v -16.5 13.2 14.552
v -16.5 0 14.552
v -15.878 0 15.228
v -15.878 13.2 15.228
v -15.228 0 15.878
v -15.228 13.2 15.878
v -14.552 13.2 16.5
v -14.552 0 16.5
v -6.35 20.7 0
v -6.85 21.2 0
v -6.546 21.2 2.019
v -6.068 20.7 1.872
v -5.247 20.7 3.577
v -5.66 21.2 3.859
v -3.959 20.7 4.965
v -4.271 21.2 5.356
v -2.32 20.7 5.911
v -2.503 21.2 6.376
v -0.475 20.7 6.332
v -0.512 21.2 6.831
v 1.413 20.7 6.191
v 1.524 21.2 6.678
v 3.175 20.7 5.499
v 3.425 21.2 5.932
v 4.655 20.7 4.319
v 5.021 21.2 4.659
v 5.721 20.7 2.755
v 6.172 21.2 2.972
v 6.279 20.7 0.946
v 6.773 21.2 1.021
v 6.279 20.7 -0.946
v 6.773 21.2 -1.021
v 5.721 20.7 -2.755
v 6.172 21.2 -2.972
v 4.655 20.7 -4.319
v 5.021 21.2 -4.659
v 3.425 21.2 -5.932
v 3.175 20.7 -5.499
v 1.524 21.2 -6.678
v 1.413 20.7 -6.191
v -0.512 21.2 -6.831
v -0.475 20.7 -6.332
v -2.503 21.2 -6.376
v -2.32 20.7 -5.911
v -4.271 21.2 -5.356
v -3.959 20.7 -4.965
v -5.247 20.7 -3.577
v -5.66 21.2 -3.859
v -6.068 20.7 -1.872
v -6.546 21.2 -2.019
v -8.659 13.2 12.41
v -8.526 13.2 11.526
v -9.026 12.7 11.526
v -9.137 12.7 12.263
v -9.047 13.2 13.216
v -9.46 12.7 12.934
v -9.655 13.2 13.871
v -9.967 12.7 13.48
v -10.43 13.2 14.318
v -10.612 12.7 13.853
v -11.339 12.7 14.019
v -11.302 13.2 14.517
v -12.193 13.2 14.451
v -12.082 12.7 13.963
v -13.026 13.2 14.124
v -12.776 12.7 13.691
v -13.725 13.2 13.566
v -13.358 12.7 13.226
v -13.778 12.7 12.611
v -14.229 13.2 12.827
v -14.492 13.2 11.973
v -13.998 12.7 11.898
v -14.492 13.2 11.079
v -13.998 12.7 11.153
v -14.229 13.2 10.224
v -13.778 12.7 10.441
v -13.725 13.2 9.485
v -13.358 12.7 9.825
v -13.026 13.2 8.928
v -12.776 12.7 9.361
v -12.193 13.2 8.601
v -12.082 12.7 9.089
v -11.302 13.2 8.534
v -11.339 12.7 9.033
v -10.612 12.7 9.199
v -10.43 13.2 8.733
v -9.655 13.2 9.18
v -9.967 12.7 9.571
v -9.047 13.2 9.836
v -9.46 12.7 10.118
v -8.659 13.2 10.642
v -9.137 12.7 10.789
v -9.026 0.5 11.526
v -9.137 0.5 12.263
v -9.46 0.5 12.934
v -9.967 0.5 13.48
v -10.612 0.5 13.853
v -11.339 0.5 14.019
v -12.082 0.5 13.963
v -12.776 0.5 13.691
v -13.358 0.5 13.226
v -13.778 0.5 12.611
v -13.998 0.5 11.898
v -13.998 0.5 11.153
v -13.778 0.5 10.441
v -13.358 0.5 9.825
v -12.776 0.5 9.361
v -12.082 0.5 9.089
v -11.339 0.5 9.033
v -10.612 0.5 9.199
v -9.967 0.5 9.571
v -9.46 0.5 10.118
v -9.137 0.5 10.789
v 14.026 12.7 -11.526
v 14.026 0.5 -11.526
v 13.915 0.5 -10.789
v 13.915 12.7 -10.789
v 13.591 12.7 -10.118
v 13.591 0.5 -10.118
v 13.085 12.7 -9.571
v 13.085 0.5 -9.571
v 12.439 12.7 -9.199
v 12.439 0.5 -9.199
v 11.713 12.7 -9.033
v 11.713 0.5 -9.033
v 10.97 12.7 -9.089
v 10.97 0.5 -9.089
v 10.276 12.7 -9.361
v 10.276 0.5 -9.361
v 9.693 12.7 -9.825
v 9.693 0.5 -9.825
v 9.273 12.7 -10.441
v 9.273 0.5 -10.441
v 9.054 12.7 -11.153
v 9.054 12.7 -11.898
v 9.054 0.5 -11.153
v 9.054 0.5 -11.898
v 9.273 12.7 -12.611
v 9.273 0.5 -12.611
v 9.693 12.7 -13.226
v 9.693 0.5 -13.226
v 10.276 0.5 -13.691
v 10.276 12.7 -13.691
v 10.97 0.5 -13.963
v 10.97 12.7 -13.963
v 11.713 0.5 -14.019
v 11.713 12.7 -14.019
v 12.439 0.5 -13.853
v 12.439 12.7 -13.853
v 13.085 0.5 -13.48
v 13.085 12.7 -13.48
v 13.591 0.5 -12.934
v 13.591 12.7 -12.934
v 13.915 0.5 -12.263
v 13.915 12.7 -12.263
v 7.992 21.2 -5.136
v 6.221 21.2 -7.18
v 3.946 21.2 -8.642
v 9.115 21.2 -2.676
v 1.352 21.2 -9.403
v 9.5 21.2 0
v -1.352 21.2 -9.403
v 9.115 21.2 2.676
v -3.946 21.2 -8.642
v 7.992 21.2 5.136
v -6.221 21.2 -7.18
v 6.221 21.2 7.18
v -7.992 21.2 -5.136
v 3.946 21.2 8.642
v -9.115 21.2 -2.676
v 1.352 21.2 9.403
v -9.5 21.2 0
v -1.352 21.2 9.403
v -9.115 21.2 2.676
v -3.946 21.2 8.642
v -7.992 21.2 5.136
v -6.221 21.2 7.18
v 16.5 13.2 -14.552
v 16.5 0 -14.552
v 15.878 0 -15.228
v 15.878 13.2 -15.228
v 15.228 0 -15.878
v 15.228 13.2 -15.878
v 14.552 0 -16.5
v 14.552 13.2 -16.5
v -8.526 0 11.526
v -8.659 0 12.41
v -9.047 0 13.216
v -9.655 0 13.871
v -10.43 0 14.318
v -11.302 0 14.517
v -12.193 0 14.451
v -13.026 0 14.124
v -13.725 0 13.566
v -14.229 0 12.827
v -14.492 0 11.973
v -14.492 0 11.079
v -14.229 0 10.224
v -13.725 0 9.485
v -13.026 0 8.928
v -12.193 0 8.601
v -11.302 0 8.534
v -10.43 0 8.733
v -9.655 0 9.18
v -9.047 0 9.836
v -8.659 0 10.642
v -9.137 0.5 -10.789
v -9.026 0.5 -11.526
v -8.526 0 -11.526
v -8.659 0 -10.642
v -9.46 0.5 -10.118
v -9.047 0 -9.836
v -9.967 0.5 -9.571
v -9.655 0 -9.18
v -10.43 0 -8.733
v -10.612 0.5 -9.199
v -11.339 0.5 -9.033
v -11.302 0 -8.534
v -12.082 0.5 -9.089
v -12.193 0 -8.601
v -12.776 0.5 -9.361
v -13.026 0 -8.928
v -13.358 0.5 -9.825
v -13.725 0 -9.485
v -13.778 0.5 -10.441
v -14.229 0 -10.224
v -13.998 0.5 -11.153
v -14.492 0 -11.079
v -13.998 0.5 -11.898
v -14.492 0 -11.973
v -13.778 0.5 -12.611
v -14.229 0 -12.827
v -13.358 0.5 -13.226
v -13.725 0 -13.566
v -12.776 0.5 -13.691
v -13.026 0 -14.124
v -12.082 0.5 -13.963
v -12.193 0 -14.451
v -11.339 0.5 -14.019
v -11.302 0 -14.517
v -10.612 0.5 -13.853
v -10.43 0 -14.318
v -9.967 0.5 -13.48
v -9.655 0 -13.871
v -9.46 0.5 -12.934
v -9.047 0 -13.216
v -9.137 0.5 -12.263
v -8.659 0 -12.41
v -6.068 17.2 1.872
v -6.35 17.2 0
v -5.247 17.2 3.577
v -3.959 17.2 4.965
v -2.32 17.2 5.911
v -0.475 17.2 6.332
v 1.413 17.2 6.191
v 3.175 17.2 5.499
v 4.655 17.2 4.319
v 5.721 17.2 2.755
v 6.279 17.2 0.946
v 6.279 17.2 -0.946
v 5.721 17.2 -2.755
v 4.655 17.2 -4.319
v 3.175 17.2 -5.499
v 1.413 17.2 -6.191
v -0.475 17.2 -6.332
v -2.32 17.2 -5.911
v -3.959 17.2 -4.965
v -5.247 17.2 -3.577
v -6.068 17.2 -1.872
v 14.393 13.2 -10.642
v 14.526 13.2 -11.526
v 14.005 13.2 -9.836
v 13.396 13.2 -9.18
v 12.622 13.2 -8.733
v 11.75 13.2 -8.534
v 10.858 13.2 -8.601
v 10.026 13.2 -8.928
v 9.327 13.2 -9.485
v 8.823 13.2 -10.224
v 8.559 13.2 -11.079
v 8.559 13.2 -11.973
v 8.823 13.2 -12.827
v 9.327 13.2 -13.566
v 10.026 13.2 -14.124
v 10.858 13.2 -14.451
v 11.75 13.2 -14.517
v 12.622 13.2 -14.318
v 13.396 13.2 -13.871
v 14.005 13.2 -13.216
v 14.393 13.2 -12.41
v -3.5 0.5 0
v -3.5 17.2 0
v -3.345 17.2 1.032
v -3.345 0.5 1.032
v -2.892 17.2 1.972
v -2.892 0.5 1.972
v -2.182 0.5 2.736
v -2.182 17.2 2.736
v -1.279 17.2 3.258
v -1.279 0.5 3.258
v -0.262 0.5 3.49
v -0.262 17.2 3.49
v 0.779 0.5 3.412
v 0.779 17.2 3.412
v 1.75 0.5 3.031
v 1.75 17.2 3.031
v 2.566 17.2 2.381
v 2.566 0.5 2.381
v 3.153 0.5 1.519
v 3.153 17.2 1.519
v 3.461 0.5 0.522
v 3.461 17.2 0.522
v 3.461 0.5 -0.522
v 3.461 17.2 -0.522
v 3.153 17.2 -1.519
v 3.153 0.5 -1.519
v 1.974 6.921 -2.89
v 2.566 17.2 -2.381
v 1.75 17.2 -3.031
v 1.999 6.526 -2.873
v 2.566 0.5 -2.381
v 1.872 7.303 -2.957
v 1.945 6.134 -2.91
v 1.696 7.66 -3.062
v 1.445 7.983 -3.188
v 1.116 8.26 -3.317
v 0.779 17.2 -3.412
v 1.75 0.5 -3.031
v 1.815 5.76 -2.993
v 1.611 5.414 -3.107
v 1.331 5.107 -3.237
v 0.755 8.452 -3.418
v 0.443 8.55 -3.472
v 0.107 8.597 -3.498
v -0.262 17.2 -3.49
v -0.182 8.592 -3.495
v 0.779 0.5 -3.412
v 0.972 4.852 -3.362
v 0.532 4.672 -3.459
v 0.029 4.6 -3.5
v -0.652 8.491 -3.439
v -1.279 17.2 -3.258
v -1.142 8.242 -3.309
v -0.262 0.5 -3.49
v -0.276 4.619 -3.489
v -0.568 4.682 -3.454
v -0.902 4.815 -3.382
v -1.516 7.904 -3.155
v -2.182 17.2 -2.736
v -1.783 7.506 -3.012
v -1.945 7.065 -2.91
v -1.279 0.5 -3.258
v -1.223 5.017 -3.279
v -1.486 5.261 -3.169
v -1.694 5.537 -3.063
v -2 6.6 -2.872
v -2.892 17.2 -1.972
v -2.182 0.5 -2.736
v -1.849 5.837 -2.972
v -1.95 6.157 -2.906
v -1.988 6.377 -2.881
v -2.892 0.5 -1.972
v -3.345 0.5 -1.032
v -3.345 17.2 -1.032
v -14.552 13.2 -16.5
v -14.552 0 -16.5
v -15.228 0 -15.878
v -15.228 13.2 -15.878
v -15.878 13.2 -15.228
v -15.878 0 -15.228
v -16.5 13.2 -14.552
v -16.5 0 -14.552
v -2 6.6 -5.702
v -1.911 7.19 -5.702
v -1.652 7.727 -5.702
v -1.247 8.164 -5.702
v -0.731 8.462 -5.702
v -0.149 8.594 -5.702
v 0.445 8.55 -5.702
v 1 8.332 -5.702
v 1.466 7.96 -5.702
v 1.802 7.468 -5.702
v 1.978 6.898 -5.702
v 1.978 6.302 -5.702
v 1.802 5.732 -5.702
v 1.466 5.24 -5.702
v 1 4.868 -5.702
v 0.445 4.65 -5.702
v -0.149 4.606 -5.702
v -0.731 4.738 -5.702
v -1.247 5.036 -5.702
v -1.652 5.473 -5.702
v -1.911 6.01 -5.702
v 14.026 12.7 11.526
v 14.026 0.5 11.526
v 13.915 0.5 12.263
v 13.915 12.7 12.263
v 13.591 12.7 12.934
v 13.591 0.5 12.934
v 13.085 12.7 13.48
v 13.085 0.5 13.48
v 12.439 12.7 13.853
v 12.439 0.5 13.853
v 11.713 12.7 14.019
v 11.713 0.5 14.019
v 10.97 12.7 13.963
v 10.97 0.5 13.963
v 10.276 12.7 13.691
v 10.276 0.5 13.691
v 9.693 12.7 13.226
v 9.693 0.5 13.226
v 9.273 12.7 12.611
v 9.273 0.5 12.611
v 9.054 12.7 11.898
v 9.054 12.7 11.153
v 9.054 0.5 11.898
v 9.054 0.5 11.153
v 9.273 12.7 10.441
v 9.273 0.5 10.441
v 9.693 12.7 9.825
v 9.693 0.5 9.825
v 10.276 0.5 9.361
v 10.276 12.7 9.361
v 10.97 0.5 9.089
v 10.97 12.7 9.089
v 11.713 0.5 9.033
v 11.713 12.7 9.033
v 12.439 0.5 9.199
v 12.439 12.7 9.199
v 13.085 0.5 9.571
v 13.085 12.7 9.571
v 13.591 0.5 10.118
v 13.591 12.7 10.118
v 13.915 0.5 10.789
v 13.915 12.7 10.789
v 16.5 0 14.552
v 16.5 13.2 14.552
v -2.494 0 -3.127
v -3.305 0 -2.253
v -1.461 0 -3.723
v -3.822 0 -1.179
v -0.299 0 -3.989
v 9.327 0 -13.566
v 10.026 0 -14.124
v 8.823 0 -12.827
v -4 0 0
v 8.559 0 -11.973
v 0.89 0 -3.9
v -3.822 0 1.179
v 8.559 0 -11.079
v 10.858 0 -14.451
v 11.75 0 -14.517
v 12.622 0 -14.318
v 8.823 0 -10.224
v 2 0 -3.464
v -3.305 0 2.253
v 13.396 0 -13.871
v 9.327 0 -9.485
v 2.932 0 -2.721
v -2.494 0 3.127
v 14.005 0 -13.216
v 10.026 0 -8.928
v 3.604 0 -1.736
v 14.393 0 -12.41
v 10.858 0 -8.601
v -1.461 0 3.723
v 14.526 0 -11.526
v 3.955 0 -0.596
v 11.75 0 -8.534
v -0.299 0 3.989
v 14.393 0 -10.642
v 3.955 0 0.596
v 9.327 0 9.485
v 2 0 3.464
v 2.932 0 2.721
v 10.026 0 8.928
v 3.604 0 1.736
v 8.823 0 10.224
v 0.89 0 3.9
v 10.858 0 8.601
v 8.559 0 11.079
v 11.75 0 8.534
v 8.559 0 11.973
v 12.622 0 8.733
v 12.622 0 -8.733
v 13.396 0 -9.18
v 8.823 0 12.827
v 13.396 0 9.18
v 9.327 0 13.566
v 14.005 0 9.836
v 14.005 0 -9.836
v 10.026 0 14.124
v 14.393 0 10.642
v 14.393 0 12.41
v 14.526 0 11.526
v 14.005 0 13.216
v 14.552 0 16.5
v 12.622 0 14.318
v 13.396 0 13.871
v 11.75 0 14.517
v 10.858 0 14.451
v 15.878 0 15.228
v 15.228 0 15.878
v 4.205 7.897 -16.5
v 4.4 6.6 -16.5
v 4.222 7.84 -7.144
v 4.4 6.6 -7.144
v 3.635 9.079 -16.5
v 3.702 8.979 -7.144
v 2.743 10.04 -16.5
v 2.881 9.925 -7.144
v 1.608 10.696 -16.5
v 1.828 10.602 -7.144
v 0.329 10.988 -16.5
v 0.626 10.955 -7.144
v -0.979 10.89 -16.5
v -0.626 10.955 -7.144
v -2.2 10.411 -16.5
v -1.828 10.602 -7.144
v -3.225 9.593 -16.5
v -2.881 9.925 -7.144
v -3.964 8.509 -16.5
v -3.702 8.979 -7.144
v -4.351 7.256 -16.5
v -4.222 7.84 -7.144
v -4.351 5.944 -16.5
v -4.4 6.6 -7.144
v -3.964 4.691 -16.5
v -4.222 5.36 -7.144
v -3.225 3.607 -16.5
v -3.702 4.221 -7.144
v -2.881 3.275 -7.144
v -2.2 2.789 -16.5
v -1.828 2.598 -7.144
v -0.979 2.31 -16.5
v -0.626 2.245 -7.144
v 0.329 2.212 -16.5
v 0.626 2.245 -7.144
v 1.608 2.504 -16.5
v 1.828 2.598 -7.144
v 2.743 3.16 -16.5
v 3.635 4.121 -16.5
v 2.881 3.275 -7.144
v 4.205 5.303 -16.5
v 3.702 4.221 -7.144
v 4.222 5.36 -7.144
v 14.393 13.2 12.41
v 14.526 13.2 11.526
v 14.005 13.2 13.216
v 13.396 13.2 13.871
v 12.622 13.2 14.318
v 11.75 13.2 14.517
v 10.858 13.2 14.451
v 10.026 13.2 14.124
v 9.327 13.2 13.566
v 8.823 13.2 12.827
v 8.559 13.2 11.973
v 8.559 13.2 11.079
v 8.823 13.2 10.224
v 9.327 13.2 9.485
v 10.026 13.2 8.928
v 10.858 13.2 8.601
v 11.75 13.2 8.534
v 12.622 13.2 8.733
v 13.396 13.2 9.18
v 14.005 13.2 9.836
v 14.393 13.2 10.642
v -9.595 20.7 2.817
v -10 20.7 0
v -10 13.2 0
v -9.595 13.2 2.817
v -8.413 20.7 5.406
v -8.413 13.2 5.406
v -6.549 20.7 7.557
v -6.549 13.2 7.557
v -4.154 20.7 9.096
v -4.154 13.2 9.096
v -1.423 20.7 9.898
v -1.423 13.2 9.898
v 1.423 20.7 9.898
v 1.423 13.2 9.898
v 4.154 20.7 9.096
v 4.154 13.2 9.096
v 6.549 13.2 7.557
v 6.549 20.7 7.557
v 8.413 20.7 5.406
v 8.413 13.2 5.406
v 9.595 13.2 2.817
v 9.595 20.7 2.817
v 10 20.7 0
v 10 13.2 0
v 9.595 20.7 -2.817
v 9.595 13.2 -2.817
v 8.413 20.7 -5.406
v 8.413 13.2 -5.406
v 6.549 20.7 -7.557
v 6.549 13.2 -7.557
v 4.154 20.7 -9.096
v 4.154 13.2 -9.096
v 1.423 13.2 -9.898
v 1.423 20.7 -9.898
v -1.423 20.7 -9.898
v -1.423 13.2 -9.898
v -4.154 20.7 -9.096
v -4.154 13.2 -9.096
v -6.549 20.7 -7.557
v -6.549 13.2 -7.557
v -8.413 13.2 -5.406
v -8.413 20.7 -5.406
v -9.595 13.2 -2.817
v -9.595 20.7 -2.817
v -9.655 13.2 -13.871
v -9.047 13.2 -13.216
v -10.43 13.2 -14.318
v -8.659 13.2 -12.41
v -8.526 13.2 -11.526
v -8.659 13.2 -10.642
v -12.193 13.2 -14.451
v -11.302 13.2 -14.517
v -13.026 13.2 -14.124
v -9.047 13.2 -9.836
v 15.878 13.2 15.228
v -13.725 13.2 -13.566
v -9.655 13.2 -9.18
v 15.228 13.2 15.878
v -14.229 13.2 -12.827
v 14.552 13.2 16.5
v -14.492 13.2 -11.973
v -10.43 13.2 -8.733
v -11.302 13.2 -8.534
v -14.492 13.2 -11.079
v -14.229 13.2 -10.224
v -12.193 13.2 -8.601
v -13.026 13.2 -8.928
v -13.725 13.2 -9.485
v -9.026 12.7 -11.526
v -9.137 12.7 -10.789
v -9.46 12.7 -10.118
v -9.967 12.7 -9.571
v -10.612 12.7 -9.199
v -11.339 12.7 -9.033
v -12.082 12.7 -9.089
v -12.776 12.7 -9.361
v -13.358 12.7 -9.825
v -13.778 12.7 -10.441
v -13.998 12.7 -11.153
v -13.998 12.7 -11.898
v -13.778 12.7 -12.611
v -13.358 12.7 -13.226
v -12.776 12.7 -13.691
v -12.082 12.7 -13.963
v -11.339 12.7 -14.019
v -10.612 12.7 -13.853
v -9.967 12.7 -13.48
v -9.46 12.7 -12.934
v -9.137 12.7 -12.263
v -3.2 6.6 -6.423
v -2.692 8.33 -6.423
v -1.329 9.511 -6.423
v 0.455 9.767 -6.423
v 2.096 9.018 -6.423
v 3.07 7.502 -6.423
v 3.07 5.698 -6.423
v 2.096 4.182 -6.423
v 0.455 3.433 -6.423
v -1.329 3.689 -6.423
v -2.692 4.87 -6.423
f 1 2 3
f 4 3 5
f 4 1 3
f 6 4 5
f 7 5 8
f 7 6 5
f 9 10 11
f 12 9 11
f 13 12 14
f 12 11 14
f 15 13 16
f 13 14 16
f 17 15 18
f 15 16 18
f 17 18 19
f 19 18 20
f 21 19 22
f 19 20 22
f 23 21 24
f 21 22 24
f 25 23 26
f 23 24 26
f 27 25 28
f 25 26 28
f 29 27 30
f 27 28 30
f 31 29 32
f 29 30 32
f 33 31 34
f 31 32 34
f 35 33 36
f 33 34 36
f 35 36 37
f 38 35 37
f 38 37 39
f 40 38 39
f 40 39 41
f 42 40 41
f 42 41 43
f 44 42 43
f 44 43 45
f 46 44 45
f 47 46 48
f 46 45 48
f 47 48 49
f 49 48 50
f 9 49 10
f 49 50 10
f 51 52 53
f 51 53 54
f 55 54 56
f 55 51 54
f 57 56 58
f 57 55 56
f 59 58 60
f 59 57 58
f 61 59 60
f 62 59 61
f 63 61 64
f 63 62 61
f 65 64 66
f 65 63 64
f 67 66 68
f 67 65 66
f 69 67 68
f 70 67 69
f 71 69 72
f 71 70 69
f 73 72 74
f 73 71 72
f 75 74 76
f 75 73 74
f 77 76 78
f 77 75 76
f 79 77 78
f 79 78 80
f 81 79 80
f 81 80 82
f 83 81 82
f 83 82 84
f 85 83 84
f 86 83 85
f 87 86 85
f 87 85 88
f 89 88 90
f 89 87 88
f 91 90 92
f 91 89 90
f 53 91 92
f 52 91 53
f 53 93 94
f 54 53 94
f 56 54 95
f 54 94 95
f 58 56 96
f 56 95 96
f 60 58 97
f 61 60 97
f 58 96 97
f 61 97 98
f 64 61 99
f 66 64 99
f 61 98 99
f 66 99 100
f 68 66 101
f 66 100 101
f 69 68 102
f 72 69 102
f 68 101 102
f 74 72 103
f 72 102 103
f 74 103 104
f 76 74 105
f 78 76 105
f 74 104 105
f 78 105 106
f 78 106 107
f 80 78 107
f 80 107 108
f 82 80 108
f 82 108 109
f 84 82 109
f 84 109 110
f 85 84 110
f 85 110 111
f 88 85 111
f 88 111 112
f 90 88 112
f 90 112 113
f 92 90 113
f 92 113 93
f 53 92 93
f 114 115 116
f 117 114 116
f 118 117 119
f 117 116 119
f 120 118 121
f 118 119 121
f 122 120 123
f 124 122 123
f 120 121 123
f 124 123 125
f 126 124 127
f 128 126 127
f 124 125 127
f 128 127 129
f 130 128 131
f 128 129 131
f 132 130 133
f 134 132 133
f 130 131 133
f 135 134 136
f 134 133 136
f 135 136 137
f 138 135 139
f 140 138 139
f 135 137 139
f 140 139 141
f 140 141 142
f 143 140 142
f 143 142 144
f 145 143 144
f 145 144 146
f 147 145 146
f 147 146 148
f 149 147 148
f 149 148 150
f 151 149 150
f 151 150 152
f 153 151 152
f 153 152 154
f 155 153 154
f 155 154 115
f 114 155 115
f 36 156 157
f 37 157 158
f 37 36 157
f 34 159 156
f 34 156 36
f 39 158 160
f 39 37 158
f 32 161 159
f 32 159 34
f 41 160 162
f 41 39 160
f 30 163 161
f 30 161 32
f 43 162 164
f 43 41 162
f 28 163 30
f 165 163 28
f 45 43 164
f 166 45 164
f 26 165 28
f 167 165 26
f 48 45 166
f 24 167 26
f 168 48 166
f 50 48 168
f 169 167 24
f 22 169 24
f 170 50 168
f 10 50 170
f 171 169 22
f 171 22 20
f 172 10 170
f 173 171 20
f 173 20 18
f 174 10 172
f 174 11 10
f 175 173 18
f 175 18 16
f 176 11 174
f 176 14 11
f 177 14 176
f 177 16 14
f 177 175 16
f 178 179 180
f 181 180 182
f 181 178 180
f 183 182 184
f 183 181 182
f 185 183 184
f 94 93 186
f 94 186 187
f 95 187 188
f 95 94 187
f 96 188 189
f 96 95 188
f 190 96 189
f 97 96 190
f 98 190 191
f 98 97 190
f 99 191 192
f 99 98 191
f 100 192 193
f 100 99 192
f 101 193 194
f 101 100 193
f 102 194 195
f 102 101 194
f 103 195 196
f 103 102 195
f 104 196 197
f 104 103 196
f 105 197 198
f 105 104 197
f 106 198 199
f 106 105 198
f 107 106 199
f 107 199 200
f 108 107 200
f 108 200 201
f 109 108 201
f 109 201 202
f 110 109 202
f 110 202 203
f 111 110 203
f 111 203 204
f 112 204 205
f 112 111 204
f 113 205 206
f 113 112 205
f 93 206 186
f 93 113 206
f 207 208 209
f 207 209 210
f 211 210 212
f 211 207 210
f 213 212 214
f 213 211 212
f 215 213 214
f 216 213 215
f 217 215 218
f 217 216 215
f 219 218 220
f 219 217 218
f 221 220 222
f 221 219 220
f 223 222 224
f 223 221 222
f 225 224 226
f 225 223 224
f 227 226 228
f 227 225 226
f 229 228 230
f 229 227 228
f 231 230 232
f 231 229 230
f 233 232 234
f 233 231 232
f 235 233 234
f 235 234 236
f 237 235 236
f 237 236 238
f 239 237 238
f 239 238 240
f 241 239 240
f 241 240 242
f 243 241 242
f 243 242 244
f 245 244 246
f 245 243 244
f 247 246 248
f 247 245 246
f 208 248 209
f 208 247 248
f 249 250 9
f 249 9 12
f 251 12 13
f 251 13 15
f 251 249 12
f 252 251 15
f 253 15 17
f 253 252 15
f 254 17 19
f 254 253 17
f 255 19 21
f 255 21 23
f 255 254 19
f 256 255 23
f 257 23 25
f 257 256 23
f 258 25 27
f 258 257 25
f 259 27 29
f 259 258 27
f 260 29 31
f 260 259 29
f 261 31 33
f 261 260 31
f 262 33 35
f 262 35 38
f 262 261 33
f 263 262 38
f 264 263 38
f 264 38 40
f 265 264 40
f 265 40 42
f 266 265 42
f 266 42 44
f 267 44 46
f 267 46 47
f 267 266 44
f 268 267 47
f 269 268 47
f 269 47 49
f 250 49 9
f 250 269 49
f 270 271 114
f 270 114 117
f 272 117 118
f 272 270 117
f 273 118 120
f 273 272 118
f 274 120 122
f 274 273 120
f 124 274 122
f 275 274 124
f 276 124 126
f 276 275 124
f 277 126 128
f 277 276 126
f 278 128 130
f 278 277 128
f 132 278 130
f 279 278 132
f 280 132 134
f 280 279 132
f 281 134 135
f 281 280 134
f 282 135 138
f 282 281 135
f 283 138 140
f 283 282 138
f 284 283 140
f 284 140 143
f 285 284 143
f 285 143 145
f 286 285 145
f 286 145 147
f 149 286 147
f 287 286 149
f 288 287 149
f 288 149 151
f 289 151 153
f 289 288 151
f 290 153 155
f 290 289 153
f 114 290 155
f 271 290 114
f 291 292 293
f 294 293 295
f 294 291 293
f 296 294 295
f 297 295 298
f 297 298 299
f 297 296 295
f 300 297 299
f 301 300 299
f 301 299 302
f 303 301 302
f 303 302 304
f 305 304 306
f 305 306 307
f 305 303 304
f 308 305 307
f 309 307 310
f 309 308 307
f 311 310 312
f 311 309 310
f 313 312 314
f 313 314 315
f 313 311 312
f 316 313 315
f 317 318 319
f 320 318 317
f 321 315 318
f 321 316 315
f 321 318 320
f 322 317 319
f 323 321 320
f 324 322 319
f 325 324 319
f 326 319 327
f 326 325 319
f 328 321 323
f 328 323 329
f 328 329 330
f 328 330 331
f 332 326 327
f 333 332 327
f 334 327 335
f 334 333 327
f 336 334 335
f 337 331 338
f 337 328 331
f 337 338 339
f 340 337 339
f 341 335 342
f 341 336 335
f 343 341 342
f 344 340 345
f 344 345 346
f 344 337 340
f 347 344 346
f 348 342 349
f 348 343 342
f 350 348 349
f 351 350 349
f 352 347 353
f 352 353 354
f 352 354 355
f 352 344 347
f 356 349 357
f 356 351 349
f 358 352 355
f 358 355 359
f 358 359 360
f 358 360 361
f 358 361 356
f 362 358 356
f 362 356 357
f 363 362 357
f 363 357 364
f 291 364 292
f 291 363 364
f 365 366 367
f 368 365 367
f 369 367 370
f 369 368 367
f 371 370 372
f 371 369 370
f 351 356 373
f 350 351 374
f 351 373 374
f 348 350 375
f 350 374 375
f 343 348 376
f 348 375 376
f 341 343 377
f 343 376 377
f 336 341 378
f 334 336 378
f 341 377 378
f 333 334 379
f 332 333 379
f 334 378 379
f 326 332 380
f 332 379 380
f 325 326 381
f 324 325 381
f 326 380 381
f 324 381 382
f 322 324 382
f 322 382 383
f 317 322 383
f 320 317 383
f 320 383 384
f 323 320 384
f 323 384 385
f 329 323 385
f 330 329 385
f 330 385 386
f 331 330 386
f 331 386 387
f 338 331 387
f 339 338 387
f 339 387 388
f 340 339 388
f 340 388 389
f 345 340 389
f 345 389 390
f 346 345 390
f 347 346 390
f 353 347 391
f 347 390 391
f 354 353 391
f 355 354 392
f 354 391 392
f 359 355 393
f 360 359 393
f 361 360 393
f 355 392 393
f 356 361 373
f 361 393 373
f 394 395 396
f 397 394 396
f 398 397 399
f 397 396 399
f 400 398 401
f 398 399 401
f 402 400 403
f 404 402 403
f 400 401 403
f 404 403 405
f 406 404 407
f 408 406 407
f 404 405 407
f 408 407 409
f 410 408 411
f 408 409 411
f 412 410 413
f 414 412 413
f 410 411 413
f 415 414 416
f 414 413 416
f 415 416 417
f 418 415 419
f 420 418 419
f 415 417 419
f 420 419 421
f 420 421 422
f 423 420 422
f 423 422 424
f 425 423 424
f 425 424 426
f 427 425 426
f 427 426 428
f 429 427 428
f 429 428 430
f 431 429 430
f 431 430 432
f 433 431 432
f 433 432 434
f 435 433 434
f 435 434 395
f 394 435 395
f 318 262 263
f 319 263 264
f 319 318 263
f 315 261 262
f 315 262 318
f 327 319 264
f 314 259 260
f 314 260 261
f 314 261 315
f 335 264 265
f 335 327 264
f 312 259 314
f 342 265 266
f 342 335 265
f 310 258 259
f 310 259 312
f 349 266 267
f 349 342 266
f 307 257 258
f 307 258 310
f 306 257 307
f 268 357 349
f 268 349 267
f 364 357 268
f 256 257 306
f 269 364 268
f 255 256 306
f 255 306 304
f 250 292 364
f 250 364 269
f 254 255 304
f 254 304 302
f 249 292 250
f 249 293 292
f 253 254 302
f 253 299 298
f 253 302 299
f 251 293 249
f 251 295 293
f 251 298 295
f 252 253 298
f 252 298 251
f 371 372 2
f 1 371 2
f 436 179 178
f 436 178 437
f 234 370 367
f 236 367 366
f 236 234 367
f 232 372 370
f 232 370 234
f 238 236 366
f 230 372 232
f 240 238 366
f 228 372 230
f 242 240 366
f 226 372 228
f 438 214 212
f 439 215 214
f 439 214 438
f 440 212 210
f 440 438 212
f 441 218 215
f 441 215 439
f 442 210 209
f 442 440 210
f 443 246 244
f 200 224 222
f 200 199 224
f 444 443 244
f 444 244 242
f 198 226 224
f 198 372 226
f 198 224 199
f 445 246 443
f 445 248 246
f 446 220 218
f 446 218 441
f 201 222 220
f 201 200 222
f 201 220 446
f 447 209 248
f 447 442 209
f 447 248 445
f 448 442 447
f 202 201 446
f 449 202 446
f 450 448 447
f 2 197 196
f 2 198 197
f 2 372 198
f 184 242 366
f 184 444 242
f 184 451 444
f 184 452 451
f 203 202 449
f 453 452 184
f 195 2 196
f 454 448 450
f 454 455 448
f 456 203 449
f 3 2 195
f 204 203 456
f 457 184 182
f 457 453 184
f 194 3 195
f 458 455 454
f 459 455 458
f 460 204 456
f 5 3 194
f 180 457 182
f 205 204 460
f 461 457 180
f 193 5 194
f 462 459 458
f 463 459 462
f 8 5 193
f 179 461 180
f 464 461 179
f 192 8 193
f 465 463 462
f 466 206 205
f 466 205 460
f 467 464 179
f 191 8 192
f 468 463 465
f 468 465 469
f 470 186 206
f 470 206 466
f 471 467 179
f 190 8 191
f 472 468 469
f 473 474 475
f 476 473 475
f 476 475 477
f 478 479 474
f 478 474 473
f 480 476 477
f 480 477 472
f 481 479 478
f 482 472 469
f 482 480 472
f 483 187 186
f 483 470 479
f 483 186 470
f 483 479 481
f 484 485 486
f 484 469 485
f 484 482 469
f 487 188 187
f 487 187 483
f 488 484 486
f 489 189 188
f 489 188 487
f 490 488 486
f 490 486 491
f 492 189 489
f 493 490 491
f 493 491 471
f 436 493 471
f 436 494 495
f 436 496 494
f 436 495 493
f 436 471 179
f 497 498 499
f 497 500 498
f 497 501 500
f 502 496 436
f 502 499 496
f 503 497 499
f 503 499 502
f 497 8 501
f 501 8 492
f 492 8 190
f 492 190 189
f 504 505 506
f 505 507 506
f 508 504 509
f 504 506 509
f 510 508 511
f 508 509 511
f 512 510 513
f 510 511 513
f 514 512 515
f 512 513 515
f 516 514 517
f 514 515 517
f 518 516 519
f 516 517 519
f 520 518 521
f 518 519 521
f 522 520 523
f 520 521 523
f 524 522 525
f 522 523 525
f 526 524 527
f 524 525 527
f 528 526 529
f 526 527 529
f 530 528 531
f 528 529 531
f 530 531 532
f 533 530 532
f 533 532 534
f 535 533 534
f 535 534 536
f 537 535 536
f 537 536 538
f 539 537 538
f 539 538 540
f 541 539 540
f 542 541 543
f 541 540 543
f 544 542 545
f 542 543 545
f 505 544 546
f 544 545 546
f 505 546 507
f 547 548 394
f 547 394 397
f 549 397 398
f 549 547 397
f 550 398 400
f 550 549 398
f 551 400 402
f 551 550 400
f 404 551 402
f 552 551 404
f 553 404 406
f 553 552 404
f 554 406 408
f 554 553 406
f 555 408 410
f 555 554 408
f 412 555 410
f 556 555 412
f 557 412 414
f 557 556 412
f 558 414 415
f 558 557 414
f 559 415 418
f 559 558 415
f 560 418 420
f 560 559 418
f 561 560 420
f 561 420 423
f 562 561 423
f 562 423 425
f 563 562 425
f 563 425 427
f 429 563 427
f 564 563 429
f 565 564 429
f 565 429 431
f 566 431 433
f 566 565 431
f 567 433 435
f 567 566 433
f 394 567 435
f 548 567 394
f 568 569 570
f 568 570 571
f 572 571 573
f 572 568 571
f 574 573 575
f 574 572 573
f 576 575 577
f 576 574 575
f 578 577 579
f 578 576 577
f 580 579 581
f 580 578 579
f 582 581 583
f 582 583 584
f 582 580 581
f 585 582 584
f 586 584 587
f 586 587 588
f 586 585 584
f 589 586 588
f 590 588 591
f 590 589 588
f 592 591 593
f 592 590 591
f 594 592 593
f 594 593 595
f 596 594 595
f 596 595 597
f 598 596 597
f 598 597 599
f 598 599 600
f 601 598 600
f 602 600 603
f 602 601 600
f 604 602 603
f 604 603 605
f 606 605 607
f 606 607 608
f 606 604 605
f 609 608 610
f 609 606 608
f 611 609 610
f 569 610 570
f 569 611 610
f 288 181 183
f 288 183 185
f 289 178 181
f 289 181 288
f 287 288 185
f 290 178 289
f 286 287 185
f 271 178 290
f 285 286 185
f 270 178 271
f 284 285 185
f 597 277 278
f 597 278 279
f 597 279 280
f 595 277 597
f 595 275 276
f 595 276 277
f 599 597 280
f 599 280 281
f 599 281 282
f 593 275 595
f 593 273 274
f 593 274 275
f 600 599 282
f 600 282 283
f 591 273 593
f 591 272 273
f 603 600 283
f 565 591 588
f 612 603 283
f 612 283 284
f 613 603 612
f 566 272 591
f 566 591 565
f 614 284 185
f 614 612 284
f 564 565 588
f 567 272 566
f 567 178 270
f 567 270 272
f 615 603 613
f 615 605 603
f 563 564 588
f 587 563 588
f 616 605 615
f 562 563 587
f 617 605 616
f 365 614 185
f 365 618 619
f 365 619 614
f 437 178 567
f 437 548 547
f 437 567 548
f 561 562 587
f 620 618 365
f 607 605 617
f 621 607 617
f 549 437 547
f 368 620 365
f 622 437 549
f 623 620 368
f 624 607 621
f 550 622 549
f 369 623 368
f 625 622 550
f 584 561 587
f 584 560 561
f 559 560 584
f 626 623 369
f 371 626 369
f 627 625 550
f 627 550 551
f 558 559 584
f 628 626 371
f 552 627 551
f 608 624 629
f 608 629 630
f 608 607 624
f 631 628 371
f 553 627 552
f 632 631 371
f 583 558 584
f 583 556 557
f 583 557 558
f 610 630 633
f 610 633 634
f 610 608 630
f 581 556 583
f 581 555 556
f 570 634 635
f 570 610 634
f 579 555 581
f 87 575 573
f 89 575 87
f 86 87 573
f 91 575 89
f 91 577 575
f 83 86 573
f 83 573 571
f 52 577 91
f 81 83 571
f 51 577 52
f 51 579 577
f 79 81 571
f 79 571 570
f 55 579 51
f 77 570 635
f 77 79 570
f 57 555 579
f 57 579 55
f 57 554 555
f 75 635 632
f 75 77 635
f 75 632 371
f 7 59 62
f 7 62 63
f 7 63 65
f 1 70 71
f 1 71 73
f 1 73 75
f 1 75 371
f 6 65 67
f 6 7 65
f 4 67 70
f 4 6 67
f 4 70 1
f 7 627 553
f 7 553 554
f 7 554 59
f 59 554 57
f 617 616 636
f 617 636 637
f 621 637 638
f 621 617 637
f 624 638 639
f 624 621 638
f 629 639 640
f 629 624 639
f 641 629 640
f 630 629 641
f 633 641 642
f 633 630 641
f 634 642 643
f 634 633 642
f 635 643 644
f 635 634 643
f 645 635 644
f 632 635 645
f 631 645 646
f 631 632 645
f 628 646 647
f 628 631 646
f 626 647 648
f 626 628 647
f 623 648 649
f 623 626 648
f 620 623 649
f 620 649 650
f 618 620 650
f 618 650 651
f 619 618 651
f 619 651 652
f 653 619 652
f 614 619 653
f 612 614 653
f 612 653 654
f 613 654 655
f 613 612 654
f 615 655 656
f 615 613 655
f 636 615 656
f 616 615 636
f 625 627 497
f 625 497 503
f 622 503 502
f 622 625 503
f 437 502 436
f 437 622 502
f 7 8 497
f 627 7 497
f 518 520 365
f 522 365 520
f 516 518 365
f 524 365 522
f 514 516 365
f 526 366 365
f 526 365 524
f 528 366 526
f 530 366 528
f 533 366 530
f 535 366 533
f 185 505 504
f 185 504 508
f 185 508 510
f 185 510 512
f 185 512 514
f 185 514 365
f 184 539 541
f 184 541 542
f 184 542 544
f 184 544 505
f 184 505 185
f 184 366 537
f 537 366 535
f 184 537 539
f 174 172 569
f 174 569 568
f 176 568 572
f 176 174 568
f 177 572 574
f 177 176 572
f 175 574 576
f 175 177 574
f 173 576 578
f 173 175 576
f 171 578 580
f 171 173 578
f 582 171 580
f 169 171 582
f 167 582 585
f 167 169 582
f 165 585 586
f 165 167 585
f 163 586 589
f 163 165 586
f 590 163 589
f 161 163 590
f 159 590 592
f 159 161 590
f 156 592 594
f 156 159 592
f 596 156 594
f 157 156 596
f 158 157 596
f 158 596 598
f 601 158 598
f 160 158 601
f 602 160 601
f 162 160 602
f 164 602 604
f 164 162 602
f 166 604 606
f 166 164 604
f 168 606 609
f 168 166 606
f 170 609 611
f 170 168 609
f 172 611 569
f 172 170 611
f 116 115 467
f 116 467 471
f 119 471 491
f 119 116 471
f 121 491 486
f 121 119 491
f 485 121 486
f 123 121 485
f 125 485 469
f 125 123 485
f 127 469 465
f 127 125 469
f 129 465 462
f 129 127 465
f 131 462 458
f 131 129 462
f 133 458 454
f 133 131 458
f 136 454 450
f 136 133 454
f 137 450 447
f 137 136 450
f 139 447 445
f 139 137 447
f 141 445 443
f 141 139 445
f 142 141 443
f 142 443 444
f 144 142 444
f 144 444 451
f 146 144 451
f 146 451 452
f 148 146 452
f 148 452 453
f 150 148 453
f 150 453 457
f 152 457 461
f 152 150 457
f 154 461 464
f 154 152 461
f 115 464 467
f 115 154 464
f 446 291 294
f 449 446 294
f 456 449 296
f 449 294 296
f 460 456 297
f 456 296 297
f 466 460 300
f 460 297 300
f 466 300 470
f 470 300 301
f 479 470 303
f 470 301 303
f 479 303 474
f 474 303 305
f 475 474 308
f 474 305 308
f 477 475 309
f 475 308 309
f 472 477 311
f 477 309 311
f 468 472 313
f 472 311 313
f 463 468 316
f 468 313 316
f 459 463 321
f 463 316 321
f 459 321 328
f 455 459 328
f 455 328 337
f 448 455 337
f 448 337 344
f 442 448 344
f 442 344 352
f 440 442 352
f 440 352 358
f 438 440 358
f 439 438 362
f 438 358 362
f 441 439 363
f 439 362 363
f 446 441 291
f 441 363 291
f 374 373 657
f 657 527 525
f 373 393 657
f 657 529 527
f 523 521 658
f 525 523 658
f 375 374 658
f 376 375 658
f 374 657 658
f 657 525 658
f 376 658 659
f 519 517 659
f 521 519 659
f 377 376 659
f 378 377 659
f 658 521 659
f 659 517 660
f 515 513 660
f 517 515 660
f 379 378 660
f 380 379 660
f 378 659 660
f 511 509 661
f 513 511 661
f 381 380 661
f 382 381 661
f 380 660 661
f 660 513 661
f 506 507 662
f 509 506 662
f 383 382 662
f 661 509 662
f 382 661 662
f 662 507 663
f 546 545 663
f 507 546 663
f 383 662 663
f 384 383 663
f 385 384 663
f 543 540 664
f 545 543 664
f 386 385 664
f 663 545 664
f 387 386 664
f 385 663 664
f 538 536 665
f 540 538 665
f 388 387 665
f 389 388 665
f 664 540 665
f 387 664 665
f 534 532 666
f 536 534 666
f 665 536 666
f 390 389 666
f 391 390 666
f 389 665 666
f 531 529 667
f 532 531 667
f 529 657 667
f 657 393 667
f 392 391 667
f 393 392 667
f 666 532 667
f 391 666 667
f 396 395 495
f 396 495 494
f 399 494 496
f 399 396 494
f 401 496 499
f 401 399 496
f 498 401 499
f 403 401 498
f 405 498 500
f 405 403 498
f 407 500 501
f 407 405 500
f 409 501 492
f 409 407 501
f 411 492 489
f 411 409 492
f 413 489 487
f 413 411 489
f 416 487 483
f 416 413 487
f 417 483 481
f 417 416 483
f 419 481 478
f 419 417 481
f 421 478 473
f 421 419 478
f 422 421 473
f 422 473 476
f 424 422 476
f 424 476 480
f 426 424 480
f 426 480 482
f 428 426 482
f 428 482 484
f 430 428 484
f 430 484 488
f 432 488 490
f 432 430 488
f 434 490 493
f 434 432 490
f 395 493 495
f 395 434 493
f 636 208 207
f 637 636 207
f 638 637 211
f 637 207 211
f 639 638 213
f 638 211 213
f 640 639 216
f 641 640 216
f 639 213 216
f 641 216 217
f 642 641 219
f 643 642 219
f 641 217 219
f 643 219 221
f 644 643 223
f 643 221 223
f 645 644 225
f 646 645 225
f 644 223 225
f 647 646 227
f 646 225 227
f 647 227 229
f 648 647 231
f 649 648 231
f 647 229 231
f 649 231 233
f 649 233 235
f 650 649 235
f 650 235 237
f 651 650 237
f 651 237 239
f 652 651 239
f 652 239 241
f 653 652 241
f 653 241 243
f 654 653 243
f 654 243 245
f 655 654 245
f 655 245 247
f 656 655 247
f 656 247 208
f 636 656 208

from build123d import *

# Parameters (mm, degrees)
SKETCH3_W               = 61.087252859
SKETCH3_H               = 56.880141781
SKETCH3_W_2             = 33
SKETCH3_H_2             = 33
CUT_EXTRUDE1_DEPTH      = 22.2
SKETCH6_R               = 2.5
CUT_EXTRUDE5_DEPTH      = 22.2
CUT_EXTRUDE3_REACH      = 35
SKETCH5_R               = 2
G1_8_TAPPED_HOLE1_D     = 8.8
G1_8_TAPPED_HOLE1_DEPTH = 9.356213276
G1_8_TAPPED_HOLE1_TIP   = 2.643786724
CHAMFER1_SIZE           = 0.5


with BuildPart() as part:
    # Sketch2 → Revolve1 (revolve)
    with BuildSketch(Plane.XY):
        Polygon((-3.5, 0), (-22, 0), (-22, 13.2), (-10, 13.2), (-10, 21.2), (-6.35, 21.2), (-6.35, 17.2), (-3.5, 17.2), align=None)
    revolve(axis=Axis((0, 0, 0), (0, 1, 0)))

    # Sketch3 → Cut-Extrude1 (cut, through all)
    with BuildSketch(Plane.XZ):
        with Locations((1.009706659, -0.631066662)):
            Rectangle(SKETCH3_W, SKETCH3_H)
        Rectangle(SKETCH3_W_2, SKETCH3_H_2, mode=Mode.SUBTRACT)
    extrude(amount=-CUT_EXTRUDE1_DEPTH, mode=Mode.SUBTRACT)

    # Sketch6 → Cut-Extrude5 (cut, through all)
    with BuildSketch(Plane.XZ):
        with Locations((-11.525840533, 11.525840533)):
            Circle(SKETCH6_R)
        with Locations((11.525840533, 11.525840533)):
            Circle(SKETCH6_R)
        with Locations((-11.525840533, -11.525840533)):
            Circle(SKETCH6_R)
        with Locations((11.525840533, -11.525840533)):
            Circle(SKETCH6_R)
    extrude(amount=-CUT_EXTRUDE5_DEPTH, mode=Mode.SUBTRACT)

    # Sketch5 → Cut-Extrude3 (cut, up to next)
    with BuildSketch(Plane(origin=(0, 0, -16.5), x_dir=(-1, 0, 0), z_dir=(0, 0, -1)), mode=Mode.PRIVATE) as cut_extrude3_sk1:
        with Locations((0, 6.6)):
            Circle(SKETCH5_R)
    cut_extrude3_tool1 = extrude(cut_extrude3_sk1.sketch, amount=-CUT_EXTRUDE3_REACH, mode=Mode.PRIVATE) & part.part
    add(cut_extrude3_tool1.solids().sort_by_distance((0, 6.6, -16.5))[0], mode=Mode.SUBTRACT)

    # G1/8 Tapped Hole1
    with Locations(Plane(origin=(0, 6.6, -16.5), x_dir=(-1, 0, 0), z_dir=(0, 0, -1))):
        with Locations((0, 0)):
            Hole(G1_8_TAPPED_HOLE1_D / 2, depth=G1_8_TAPPED_HOLE1_DEPTH)
            with Locations((0, 0, -(G1_8_TAPPED_HOLE1_DEPTH + G1_8_TAPPED_HOLE1_TIP / 2))):  # 118° drill point
                Cone(0, G1_8_TAPPED_HOLE1_D / 2, G1_8_TAPPED_HOLE1_TIP, mode=Mode.SUBTRACT)

    # Chamfer1
    chamfer1_edges = [part.edges().sort_by_distance(p)[0] for p in [
        (6.35, 21.2, 0),
        (3.5, 0, 0),
        (-14.025840533, 13.2, -11.525840533),
        (-14.025840533, 0, -11.525840533),
        (9.025840533, 13.2, 11.525840533),
        (9.025840533, 0, 11.525840533),
        (9.025840533, 13.2, -11.525840533),
        (9.025840533, 0, -11.525840533),
        (-14.025840533, 13.2, 11.525840533),
        (-14.025840533, 0, 11.525840533),
        (10, 21.2, 0),
    ]]
    chamfer(chamfer1_edges, length=CHAMFER1_SIZE)


solid = part.part
